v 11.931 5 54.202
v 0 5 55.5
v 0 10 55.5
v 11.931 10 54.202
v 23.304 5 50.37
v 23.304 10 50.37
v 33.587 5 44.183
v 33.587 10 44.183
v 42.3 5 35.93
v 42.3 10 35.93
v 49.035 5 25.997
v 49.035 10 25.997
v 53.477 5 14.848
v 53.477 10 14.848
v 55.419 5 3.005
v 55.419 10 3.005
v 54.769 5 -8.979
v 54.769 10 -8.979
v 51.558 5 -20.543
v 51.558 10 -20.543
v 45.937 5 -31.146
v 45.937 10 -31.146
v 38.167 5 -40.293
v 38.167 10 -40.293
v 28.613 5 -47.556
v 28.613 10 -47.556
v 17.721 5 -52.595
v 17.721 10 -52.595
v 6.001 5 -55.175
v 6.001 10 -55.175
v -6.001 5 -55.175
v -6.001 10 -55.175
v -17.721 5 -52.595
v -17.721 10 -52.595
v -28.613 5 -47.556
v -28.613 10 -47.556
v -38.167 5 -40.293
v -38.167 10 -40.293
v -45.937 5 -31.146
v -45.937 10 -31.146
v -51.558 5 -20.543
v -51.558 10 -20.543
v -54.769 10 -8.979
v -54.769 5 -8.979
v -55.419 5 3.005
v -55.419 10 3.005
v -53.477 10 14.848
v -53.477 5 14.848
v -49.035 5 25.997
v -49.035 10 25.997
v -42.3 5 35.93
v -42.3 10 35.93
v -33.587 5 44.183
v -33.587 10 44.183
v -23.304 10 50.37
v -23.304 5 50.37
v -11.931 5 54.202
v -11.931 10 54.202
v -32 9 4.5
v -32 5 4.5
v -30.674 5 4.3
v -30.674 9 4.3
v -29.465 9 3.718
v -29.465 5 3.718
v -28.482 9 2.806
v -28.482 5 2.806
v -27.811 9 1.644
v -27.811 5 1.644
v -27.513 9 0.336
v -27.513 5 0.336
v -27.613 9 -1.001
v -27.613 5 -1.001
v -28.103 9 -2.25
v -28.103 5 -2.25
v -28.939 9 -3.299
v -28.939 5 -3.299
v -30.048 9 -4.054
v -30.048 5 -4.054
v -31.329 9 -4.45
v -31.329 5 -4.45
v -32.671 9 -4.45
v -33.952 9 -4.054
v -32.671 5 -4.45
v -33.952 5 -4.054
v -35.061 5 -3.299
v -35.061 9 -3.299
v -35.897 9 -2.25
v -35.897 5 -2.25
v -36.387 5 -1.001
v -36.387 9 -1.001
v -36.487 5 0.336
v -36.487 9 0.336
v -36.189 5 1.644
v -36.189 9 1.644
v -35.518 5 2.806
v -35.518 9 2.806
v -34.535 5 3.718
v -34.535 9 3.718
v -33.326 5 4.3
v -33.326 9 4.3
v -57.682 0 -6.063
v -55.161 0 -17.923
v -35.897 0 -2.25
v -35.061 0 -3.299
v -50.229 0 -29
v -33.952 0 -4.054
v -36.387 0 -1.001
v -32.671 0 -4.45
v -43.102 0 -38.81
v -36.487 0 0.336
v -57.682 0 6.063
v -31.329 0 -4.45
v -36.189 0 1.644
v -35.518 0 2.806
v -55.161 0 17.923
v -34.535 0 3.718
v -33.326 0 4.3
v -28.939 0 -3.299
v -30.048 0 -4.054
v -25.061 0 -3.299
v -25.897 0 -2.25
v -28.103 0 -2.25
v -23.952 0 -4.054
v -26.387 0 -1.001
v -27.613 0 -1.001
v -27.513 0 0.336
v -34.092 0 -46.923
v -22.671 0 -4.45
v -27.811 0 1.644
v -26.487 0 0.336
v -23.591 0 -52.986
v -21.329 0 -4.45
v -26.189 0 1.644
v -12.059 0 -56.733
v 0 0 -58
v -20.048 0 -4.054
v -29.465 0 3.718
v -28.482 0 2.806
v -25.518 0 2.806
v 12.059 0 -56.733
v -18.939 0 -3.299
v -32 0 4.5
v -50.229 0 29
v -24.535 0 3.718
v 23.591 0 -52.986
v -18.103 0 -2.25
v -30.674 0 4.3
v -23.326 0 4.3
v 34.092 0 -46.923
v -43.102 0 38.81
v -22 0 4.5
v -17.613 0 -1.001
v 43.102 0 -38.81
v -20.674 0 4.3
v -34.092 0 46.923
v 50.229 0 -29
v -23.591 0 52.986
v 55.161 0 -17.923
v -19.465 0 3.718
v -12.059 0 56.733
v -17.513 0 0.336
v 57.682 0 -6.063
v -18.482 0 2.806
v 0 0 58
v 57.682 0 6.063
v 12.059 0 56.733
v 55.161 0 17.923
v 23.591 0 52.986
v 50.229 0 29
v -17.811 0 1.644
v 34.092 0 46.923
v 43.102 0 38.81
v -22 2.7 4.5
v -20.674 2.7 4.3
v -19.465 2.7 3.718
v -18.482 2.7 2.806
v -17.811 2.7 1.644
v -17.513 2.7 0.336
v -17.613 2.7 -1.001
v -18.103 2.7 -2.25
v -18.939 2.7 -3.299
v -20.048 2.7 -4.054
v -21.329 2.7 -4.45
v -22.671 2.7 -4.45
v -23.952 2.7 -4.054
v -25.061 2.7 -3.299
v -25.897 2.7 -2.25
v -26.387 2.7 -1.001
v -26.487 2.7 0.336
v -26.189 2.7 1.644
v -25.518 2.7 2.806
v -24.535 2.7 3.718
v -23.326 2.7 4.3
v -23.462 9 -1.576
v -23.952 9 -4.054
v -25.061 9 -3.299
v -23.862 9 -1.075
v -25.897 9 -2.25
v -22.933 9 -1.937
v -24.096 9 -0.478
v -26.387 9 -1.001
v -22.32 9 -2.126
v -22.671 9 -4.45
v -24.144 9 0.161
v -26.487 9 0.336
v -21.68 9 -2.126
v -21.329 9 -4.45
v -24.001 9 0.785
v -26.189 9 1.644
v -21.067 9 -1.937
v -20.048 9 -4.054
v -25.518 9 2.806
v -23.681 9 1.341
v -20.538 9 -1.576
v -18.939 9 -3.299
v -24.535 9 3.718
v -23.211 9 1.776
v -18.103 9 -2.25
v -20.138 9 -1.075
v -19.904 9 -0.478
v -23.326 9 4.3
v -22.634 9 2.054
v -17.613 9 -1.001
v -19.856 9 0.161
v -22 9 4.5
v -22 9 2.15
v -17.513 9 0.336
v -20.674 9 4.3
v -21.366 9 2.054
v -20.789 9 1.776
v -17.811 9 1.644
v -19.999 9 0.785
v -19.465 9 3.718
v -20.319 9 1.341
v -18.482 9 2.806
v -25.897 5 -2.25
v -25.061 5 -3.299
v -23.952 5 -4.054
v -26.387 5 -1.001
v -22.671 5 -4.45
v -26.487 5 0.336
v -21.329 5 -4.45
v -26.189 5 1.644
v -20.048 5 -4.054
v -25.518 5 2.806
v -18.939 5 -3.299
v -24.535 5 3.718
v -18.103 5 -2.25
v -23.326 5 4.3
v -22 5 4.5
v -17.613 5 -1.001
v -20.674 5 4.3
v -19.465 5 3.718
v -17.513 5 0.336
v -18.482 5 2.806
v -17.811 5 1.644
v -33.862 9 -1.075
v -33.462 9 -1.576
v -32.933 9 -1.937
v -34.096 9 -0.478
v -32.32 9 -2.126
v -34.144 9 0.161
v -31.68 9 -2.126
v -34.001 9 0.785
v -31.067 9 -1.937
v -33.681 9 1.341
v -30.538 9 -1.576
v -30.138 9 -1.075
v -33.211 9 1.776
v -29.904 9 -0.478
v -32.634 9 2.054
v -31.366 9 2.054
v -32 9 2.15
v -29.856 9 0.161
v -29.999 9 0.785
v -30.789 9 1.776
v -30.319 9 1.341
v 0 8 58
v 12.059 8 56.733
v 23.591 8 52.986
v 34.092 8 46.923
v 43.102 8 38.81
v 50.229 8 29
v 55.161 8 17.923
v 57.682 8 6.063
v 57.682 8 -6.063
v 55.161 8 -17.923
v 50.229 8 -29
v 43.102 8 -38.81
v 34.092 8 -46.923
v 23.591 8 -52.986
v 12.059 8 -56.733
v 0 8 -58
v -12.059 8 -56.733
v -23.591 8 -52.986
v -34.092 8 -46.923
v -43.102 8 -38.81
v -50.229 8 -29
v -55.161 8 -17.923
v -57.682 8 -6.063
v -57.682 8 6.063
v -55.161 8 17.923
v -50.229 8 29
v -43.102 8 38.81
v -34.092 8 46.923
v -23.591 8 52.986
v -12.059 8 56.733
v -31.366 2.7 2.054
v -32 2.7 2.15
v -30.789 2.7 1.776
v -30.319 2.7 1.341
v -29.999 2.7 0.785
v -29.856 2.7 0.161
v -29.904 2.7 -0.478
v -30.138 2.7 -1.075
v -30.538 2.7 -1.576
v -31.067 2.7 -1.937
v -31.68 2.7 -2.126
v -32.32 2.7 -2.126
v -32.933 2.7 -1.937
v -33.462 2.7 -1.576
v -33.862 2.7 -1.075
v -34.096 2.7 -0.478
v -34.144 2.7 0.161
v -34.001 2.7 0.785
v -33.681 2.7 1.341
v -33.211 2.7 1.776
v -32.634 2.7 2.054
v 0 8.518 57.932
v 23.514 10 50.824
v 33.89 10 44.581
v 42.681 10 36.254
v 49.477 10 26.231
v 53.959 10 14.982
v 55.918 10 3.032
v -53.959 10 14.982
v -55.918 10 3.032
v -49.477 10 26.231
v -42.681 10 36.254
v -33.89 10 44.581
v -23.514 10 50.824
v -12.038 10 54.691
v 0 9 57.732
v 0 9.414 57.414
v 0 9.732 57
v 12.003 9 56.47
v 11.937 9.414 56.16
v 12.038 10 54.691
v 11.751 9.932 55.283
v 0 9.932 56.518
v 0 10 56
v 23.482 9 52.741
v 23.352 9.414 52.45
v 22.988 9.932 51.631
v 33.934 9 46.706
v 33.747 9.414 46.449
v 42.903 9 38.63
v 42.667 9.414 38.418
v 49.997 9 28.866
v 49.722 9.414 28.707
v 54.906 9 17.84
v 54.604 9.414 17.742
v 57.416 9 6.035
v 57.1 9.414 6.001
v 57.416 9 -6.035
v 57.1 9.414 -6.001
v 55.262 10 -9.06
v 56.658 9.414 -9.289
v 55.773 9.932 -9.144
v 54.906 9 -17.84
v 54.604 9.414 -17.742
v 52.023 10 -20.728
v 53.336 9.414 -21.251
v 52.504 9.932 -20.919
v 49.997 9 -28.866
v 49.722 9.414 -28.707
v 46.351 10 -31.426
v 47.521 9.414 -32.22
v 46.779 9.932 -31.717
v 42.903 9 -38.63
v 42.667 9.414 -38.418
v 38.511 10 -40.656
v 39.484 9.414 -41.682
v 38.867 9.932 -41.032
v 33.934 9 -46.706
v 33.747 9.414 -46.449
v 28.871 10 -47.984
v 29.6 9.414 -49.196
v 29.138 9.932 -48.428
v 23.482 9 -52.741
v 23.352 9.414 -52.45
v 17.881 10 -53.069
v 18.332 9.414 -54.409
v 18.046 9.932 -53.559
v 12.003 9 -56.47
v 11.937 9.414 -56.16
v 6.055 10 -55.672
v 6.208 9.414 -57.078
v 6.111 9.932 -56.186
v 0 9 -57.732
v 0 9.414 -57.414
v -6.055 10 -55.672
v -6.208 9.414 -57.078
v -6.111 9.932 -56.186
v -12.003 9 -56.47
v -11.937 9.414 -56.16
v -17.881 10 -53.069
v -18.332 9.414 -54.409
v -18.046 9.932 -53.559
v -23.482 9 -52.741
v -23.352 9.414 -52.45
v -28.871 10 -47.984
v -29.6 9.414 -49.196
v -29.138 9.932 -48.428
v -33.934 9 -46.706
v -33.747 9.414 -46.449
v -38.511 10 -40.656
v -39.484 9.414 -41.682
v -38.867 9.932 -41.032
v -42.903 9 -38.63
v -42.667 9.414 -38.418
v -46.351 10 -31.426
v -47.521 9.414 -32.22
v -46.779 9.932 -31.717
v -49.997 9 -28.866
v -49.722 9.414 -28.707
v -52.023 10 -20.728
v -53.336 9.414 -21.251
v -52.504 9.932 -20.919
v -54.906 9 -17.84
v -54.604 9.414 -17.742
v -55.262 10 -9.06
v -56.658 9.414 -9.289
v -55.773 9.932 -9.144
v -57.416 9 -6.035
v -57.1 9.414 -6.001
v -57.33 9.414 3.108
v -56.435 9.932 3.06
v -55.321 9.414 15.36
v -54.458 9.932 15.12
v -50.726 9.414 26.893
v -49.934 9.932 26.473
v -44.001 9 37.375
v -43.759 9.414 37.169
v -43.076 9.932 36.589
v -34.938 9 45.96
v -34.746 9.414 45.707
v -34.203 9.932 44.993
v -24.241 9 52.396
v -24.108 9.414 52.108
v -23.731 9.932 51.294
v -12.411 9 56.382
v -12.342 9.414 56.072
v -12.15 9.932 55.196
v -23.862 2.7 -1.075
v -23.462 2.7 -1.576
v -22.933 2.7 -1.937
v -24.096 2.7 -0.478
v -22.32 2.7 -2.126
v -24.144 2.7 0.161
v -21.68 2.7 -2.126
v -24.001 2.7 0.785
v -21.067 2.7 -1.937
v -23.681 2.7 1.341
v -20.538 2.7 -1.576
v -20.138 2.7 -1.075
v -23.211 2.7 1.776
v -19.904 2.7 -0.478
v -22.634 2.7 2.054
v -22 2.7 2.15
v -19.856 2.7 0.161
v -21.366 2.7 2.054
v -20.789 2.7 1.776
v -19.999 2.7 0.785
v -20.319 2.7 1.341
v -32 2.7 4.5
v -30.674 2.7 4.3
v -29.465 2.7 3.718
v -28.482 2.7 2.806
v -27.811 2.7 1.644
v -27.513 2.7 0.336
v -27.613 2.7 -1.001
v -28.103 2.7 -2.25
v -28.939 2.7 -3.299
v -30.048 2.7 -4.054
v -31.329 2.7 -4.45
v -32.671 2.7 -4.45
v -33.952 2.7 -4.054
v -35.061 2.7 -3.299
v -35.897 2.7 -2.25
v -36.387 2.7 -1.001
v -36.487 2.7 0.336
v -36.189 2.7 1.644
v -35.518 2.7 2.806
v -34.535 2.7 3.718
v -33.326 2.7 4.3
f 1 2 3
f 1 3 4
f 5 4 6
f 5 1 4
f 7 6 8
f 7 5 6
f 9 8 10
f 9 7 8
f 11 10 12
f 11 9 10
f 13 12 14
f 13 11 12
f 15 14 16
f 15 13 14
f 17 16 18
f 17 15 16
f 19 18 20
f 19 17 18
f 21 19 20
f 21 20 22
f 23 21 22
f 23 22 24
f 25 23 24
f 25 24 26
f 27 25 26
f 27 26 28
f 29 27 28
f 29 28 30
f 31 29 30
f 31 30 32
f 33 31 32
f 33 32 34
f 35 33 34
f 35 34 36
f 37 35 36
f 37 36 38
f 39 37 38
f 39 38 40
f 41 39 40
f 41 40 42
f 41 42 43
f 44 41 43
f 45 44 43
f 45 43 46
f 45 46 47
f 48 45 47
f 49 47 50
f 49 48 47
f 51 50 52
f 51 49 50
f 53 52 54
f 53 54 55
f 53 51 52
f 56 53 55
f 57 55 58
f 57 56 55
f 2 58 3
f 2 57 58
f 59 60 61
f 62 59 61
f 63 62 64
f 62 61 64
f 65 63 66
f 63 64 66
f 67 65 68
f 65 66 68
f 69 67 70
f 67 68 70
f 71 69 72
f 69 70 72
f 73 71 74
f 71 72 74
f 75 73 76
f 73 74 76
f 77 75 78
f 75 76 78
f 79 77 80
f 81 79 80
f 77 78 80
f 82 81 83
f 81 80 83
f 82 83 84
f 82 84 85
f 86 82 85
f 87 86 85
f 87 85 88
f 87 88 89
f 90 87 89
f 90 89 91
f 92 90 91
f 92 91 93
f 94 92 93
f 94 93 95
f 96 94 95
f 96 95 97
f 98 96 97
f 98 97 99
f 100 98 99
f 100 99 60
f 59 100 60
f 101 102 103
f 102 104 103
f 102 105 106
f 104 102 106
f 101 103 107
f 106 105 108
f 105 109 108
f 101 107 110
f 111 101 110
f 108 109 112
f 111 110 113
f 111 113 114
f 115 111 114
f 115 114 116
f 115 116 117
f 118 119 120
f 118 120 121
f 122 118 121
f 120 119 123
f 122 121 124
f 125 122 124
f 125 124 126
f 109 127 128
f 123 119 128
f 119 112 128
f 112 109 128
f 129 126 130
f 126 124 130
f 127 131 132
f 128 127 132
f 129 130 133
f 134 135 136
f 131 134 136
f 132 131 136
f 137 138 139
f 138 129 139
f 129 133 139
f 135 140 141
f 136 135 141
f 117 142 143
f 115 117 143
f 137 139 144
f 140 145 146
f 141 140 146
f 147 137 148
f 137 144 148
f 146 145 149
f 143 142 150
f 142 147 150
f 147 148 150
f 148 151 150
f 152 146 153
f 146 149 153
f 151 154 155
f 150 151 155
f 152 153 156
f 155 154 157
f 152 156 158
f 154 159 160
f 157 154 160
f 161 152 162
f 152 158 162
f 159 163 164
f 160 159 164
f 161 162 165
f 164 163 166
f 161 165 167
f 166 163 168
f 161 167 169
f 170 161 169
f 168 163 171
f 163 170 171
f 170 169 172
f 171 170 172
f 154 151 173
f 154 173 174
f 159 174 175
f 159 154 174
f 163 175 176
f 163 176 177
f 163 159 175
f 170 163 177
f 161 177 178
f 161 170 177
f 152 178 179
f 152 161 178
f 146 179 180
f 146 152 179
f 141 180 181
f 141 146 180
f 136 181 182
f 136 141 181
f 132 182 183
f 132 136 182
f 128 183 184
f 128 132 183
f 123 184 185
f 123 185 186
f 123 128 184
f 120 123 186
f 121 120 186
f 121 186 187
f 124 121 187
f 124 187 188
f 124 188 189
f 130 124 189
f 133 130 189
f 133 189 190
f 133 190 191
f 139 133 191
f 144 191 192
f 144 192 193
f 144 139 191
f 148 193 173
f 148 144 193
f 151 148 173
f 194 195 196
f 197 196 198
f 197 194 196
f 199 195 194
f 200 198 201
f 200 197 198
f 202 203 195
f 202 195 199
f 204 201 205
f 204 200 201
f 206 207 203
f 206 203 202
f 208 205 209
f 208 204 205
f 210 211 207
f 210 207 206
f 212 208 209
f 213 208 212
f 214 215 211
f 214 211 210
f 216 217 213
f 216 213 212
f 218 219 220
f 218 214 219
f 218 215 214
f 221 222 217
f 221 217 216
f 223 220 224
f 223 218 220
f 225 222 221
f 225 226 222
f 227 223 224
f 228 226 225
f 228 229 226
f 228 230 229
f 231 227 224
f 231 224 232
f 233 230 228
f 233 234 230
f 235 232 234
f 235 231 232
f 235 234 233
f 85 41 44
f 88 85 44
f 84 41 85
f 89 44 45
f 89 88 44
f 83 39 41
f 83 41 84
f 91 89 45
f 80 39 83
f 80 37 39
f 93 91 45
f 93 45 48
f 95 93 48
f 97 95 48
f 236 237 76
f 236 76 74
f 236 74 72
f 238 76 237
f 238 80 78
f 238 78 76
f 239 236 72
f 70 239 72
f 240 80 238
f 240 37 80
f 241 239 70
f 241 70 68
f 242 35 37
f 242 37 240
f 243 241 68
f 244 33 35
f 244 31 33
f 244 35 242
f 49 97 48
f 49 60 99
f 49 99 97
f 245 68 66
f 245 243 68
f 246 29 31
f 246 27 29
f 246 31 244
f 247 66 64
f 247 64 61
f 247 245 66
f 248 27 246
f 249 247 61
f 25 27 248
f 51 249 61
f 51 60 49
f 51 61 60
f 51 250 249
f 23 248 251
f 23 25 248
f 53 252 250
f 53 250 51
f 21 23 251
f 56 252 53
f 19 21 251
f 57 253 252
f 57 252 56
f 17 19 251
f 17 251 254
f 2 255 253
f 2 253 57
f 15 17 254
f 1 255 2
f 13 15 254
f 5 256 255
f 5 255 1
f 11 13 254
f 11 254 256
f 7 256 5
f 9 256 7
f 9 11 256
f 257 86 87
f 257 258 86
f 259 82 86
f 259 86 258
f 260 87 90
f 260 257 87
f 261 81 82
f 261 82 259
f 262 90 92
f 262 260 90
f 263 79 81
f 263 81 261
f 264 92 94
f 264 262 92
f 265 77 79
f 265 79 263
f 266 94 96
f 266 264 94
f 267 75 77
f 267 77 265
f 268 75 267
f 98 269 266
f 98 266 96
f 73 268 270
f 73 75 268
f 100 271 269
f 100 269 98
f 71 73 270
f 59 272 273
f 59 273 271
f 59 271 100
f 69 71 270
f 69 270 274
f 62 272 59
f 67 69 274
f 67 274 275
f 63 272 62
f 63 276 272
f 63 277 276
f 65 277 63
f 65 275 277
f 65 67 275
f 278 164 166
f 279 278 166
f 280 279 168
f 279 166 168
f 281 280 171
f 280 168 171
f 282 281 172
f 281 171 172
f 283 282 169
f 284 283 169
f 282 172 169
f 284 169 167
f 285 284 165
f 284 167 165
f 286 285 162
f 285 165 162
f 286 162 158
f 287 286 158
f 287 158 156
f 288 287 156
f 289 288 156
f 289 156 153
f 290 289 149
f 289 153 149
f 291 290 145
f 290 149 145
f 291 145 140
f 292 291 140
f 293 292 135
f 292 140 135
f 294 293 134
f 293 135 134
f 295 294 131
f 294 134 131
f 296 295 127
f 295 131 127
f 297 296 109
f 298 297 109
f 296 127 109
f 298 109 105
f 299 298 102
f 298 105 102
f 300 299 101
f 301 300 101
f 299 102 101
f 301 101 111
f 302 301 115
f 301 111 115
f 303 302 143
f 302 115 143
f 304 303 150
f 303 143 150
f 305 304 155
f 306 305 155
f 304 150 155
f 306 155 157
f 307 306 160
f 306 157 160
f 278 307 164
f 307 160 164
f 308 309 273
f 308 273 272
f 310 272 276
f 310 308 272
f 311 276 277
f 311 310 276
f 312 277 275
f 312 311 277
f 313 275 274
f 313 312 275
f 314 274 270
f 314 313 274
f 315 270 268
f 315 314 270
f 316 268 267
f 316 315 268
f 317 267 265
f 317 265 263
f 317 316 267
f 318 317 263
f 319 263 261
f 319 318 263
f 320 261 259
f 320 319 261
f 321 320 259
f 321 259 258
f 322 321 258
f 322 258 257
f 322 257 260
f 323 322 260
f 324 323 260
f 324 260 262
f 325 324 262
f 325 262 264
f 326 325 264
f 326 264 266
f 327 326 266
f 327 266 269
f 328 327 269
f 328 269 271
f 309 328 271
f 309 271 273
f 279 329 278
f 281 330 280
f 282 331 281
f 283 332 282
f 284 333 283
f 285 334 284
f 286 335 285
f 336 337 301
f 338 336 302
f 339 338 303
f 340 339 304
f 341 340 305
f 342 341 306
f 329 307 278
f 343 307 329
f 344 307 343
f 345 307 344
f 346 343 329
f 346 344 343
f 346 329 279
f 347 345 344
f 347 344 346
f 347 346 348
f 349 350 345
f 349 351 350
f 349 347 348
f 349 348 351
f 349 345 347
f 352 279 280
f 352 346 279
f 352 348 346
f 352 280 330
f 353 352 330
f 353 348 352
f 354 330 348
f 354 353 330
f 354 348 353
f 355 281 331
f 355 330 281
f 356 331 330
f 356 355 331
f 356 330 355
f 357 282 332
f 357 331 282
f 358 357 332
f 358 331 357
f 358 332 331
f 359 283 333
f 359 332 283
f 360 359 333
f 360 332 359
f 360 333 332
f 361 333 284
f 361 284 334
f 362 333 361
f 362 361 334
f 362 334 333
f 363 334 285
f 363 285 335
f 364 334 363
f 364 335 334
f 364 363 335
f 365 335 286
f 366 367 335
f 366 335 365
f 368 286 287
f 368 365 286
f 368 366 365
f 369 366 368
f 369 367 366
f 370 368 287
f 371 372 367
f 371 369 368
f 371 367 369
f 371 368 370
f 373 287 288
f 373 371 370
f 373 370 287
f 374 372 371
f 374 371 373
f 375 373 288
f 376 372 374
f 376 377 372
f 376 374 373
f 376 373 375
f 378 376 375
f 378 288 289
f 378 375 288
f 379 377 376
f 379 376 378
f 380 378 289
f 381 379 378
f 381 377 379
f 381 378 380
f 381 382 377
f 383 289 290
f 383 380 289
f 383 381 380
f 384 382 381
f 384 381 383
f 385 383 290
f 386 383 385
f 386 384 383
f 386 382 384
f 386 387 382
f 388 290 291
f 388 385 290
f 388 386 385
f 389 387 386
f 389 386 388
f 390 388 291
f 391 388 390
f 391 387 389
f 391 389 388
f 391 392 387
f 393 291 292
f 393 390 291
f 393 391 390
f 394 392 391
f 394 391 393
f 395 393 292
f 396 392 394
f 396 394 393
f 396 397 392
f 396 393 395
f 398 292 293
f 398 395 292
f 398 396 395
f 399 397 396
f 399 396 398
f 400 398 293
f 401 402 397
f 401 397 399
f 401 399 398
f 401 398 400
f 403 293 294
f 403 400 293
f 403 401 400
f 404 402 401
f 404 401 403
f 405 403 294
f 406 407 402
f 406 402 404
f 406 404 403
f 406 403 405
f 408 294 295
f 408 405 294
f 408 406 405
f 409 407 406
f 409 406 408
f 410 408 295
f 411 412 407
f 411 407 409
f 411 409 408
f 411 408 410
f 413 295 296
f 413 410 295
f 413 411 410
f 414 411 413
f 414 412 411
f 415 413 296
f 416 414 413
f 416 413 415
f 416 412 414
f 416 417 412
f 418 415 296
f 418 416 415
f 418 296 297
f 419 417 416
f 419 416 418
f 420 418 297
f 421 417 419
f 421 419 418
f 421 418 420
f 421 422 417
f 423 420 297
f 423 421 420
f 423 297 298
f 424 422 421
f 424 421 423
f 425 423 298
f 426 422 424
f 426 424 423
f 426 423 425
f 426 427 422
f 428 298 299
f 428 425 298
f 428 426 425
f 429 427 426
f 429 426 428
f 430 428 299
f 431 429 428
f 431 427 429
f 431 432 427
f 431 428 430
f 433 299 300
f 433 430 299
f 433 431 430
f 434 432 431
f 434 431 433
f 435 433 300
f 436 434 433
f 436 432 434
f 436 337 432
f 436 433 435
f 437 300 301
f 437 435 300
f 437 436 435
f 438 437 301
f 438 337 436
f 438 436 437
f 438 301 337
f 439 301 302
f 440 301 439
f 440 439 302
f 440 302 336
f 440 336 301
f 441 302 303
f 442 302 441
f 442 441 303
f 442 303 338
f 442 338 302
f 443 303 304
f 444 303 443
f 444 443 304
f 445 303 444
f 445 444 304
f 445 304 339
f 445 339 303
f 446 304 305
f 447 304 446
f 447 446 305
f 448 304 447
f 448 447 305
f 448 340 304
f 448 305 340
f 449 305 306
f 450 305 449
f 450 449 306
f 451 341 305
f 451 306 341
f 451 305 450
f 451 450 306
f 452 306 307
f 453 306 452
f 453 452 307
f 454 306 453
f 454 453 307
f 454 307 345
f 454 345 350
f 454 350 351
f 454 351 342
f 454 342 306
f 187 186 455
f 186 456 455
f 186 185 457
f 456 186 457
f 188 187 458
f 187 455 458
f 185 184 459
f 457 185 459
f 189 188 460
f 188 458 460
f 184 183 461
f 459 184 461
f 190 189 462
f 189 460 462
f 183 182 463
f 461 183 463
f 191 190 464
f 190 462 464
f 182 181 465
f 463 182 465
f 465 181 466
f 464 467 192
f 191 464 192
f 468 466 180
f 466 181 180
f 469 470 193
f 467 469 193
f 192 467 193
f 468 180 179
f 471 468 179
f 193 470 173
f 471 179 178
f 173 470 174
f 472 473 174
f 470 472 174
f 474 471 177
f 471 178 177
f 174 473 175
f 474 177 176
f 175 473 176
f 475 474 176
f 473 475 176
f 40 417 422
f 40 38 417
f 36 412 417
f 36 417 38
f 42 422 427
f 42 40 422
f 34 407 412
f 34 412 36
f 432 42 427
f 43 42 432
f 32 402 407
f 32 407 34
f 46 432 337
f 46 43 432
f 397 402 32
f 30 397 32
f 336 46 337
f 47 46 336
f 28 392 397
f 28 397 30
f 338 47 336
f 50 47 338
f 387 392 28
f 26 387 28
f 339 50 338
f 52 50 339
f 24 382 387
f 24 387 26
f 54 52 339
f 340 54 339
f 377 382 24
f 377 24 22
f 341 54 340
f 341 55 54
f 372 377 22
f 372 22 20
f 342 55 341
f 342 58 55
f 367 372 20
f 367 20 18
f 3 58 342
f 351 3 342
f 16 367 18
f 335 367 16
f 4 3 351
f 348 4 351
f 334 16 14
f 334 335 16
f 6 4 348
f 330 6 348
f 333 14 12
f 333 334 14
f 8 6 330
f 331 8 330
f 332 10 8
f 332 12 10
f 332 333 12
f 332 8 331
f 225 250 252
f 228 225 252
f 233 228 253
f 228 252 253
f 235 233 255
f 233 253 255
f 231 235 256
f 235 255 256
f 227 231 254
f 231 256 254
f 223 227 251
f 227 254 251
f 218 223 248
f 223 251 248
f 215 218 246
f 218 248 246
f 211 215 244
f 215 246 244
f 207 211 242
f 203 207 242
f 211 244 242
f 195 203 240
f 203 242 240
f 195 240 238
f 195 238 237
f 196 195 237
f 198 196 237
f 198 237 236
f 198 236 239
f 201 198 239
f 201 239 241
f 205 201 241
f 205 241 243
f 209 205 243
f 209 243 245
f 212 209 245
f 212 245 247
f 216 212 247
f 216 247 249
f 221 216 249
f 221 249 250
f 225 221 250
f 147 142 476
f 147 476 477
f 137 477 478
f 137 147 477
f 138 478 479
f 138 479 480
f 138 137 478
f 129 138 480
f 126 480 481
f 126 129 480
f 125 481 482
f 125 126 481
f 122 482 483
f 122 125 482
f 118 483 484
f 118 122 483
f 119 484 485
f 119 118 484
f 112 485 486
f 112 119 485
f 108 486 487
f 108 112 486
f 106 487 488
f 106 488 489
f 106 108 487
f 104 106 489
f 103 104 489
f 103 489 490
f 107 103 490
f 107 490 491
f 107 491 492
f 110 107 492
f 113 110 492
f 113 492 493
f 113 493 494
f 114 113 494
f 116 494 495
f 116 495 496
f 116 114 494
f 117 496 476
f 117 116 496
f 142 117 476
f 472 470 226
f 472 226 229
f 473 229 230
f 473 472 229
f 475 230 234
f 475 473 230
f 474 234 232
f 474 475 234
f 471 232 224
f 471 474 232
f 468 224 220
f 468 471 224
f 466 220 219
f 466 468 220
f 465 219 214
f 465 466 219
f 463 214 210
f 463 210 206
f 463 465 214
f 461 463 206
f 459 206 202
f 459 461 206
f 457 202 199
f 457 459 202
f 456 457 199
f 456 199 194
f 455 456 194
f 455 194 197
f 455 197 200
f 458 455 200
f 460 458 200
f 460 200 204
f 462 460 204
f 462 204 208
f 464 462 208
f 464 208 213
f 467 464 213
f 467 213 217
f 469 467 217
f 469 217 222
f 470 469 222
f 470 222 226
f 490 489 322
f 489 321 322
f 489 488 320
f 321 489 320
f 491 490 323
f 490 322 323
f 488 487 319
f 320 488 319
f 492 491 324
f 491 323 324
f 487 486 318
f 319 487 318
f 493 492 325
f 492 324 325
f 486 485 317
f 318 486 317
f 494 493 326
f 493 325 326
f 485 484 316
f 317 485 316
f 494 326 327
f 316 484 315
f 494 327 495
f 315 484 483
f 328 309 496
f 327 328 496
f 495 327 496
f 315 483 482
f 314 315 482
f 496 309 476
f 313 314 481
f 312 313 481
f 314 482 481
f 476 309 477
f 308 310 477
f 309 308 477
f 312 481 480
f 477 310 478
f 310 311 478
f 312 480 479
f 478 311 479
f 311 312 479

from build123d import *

# Parameters (mm, degrees)
SKETCH_1_R                            = 4.5
MOVING_POST_A_DEPTH                   = 9
SKETCH_2_R                            = 58
CUP_PLATE_D116_T5_DEPTH               = 5
SKETCH_3_R                            = 4.5
MOVING_POST_B_DEPTH                   = 9
SKETCH_4_R                            = 58
SKETCH_4_R_2                          = 55.5
DRIP_SKIRT_OD116_ID111_H10_DEPTH      = 10
SKETCH_5_R                            = 2.15
M4_MOVING_MOUNT_CLEARANCE_DEPTH       = 9
SKETCH_6_R                            = 4.5
M4_MOVING_HEAD_RECESS_D8P2_T2P7_DEPTH = 2.7
CUP_TOP_OUTER_ROUND_R2_R              = 2


with BuildPart() as part:
    # 草图1 → Moving_post_A (new body)
    with BuildSketch(Plane(origin=(0, 0, 0), x_dir=(1, 0, 0), z_dir=(0, 1, 0))):
        with Locations(Location((-22, 0, 0), (0, 0, 270))):
            Circle(SKETCH_1_R)
    extrude(amount=MOVING_POST_A_DEPTH)

    # 草图2 → Cup_plate_D116_T5 (add)
    with BuildSketch(Plane(origin=(0, 0, 0), x_dir=(1, 0, 0), z_dir=(0, 1, 0))):
        with Locations(Location((0, 0, 0), (0, 0, 270))):
            Circle(SKETCH_2_R)
    extrude(amount=CUP_PLATE_D116_T5_DEPTH)

    # 草图3 → Moving_post_B (add)
    with BuildSketch(Plane(origin=(0, 0, 0), x_dir=(1, 0, 0), z_dir=(0, 1, 0))):
        with Locations(Location((-32, 0, 0), (0, 0, 270))):
            Circle(SKETCH_3_R)
    extrude(amount=MOVING_POST_B_DEPTH)

    # 草图4 → Drip_skirt_OD116_ID111_H10 (add)
    with BuildSketch(Plane(origin=(0, 0, 0), x_dir=(1, 0, 0), z_dir=(0, 1, 0))):
        with Locations(Location((0, 0, 0), (0, 0, 270))):
            Circle(SKETCH_4_R)
        with Locations(Location((0, 0, 0), (0, 0, 270))):
            Circle(SKETCH_4_R_2, mode=Mode.SUBTRACT)
    extrude(amount=DRIP_SKIRT_OD116_ID111_H10_DEPTH)

    # 草图5 → M4_moving_mount_clearance (cut)
    with BuildSketch(Plane(origin=(0, 0, 0), x_dir=(1, 0, 0), z_dir=(0, 1, 0))):
        with Locations(Location((-22, 0, 0), (0, 0, 270))):
            Circle(SKETCH_5_R)
        with Locations(Location((-32, 0, 0), (0, 0, 270))):
            Circle(SKETCH_5_R)
    extrude(amount=M4_MOVING_MOUNT_CLEARANCE_DEPTH, mode=Mode.SUBTRACT)

    # 草图6 → M4_moving_head_recess_D8p2_T2p7 (cut)
    with BuildSketch(Plane(origin=(0, 0, 0), x_dir=(1, 0, 0), z_dir=(0, 1, 0))):
        with Locations(Location((-22, 0, 0), (0, 0, 270))):
            Circle(SKETCH_6_R)
        with Locations(Location((-32, 0, 0), (0, 0, 270))):
            Circle(SKETCH_6_R)
    extrude(amount=M4_MOVING_HEAD_RECESS_D8P2_T2P7_DEPTH, mode=Mode.SUBTRACT)

    # Cup_top_outer_round_R2
    cup_top_outer_round_r2_edges = [part.edges().sort_by_distance(p)[0] for p in [
        (0, 10, -58),
    ]]
    fillet(cup_top_outer_round_r2_edges, radius=CUP_TOP_OUTER_ROUND_R2_R)


solid = part.part
